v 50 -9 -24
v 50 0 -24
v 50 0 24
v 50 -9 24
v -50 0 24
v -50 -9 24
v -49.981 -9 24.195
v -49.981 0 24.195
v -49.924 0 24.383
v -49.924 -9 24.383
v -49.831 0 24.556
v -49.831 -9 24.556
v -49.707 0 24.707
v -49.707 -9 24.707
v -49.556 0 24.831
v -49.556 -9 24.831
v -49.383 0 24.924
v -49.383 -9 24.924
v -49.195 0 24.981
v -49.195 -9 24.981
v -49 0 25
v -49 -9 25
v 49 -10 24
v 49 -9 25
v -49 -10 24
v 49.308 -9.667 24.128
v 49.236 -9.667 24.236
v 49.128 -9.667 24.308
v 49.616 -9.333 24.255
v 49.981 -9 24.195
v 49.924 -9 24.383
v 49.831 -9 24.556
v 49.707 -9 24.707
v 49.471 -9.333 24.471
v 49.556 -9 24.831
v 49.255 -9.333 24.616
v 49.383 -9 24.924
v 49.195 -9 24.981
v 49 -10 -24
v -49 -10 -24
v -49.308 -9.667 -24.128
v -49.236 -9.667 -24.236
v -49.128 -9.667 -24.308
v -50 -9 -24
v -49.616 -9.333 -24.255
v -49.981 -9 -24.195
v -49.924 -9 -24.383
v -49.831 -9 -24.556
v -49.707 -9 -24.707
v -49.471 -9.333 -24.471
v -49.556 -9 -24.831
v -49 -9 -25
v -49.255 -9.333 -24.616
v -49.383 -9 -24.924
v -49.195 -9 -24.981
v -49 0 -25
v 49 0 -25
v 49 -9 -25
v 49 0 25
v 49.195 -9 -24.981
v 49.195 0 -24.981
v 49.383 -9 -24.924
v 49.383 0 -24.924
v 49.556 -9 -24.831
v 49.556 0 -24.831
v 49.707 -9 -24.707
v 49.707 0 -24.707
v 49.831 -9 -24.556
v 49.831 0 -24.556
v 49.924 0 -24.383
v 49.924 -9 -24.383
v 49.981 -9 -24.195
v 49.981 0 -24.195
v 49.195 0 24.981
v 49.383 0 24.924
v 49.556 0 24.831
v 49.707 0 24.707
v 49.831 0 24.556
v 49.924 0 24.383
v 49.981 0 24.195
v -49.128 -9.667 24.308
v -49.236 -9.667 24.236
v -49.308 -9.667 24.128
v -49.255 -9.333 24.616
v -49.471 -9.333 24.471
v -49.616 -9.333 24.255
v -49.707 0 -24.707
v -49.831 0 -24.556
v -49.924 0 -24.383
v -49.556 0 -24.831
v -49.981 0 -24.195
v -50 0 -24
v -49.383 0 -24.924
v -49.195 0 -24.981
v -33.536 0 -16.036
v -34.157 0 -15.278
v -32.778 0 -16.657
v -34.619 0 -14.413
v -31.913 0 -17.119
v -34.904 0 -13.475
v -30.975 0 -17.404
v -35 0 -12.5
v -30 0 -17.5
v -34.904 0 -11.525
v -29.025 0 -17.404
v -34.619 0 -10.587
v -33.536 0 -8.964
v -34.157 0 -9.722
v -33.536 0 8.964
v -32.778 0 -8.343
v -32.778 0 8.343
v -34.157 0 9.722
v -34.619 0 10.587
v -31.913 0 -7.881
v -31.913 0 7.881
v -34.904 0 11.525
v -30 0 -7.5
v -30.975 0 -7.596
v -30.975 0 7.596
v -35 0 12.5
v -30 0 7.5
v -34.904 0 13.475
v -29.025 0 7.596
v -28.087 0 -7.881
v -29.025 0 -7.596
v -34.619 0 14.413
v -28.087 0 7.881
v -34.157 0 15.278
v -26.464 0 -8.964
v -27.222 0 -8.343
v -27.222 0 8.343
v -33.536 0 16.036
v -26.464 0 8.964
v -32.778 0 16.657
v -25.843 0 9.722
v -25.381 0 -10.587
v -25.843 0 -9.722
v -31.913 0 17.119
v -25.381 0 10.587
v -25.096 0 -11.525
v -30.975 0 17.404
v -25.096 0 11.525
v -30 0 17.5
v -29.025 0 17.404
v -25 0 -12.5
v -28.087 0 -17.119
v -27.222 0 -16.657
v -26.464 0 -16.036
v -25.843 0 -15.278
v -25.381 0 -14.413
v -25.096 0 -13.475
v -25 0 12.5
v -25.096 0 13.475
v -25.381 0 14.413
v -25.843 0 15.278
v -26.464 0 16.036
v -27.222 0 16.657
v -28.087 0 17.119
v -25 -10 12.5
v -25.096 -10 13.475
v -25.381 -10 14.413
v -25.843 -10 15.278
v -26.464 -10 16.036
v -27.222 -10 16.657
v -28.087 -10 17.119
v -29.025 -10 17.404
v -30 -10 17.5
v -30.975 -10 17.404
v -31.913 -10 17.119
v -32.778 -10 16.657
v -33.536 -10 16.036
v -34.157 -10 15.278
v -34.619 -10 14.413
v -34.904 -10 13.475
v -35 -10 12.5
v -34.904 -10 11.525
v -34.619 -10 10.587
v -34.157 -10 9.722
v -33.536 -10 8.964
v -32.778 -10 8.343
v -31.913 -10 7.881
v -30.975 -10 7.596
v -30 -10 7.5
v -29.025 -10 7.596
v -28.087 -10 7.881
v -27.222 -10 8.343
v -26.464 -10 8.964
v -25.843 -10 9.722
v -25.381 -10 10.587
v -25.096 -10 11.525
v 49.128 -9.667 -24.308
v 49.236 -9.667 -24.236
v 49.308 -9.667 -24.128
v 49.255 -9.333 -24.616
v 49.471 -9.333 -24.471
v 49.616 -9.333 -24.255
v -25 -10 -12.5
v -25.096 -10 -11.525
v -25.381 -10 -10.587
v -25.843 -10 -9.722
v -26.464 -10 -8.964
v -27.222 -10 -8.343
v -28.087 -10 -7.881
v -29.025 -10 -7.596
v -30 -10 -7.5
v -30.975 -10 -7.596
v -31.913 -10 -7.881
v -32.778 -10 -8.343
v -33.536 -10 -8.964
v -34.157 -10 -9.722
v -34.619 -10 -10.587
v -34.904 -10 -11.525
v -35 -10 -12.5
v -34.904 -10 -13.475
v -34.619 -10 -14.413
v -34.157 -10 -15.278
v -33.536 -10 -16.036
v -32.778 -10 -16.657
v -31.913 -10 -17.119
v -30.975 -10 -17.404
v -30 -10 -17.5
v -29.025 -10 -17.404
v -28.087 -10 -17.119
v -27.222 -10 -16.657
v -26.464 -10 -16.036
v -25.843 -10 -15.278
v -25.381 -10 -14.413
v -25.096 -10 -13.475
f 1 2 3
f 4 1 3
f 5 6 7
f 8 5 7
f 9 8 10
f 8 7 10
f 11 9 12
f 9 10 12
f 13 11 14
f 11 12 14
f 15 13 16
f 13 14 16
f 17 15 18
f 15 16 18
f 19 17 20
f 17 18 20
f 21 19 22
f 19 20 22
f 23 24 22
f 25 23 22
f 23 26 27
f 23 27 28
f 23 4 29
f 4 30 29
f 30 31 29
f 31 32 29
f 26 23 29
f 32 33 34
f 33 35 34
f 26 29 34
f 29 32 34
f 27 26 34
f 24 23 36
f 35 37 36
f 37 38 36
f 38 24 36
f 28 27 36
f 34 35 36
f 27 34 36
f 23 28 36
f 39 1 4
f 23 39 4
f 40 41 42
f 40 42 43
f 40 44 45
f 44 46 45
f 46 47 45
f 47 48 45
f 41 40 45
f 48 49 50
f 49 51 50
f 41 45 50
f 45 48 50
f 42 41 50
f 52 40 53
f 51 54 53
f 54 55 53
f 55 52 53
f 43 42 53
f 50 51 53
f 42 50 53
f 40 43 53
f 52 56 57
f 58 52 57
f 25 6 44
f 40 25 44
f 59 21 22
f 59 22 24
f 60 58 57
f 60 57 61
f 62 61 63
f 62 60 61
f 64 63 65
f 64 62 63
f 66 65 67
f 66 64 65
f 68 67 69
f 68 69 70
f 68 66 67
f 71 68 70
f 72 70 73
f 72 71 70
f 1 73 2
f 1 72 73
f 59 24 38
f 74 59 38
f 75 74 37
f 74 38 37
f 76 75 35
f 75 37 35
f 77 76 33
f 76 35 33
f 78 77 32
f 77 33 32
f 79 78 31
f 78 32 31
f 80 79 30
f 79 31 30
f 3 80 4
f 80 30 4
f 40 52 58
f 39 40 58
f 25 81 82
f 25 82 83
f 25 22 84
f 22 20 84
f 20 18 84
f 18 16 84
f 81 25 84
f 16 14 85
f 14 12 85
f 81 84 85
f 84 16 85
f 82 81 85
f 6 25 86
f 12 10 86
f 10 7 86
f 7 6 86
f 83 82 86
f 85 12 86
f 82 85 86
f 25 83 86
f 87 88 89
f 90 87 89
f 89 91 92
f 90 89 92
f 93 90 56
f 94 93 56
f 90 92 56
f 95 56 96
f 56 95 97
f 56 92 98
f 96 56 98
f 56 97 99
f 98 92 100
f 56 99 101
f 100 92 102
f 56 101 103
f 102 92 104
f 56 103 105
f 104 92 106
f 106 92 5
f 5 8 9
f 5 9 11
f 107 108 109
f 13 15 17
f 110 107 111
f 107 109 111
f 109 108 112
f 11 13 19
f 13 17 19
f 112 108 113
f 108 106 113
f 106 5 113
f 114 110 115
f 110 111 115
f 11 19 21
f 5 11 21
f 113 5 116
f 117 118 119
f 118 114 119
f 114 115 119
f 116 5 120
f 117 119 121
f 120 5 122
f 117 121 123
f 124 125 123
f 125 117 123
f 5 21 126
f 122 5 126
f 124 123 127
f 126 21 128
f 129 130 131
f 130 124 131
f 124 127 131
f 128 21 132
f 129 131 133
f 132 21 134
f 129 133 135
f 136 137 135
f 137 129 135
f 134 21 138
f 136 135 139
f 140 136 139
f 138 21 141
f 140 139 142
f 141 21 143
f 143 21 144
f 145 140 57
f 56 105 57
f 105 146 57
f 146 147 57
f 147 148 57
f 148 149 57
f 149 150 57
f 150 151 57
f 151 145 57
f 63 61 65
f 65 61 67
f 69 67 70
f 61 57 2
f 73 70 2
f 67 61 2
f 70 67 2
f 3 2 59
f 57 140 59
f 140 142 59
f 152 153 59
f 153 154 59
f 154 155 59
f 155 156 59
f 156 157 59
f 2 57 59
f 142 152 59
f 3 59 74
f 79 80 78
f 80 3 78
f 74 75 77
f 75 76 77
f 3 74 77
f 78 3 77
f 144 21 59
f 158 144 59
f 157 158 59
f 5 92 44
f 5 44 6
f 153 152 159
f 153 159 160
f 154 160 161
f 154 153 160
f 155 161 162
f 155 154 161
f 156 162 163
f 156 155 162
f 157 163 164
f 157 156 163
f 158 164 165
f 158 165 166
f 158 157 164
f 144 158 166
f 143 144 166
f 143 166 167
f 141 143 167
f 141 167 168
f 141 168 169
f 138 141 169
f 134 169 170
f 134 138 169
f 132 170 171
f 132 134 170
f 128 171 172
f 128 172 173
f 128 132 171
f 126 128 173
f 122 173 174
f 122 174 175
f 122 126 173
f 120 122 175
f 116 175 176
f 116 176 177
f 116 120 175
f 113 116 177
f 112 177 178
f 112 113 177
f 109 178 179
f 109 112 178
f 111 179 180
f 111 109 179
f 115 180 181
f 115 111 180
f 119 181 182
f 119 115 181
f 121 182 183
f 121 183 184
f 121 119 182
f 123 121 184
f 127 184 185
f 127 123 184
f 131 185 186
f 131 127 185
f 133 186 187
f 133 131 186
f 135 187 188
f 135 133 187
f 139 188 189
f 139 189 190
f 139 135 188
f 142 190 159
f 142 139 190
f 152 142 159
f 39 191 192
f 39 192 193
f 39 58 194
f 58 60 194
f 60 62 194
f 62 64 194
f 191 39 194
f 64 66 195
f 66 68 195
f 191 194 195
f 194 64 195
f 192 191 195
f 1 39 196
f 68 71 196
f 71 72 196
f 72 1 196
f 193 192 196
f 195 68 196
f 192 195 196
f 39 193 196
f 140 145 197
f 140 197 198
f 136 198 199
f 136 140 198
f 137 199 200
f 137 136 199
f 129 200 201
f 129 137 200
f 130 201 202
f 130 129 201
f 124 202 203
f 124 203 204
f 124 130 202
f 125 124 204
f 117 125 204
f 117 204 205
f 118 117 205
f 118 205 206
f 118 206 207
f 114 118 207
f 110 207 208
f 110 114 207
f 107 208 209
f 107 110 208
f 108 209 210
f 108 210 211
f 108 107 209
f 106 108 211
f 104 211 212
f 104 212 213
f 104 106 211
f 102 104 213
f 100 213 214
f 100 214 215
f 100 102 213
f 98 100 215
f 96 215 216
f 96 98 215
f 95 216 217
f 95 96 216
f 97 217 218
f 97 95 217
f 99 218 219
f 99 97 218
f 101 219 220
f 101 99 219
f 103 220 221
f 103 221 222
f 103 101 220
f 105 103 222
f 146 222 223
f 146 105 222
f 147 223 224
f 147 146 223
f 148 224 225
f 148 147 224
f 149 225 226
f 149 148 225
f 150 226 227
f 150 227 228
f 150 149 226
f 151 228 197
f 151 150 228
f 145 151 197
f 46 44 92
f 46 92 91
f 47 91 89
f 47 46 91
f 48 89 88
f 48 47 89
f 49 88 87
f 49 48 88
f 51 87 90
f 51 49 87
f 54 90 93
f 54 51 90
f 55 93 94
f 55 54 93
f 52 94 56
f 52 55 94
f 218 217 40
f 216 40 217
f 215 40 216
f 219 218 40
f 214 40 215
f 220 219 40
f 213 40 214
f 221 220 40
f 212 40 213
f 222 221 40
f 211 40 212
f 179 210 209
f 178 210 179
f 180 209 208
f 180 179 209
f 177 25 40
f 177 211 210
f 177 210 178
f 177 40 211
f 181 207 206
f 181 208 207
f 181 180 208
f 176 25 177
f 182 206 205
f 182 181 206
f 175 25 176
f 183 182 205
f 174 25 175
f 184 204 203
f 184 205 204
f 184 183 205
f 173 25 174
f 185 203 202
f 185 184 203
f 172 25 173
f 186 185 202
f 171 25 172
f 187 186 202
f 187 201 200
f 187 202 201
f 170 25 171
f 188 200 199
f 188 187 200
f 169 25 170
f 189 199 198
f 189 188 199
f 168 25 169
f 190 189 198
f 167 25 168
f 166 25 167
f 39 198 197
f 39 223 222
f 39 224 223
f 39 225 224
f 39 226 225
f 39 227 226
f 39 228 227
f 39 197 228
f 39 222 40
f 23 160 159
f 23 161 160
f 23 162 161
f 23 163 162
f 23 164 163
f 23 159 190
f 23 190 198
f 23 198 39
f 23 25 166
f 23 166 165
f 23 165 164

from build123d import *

# Parameters (mm, degrees)
F0_W     = 100
F0_H     = 50
F0_R     = 5
F1_DEPTH = 10
F2_R     = 1
F3_SIZE  = 1


with BuildPart() as f1:
    # F0 (on Front) → F1 (new body)
    with BuildSketch(Plane.XZ):
        Rectangle(F0_W, F0_H)
        with Locations((-30, -12.5)):
            Circle(F0_R, mode=Mode.SUBTRACT)
        with Locations((-30, 12.5)):
            Circle(F0_R, mode=Mode.SUBTRACT)
    extrude(amount=F1_DEPTH)

    # F2
    f2_edges = [f1.edges().sort_by_distance(p)[0] for p in [
        (50, -5, -25),
        (-50, -5, -25),
        (-50, -5, 25),
        (50, -5, 25),
    ]]
    fillet(f2_edges, radius=F2_R)

    # F3
    f3_edges = [f1.edges().sort_by_distance(p)[0] for p in [
        (50, -10, 0),
        (0, -10, -25),
        (-50, -10, 0),
        (0, -10, 25),
    ]]
    chamfer(f3_edges, length=F3_SIZE)


solid = f1.part
